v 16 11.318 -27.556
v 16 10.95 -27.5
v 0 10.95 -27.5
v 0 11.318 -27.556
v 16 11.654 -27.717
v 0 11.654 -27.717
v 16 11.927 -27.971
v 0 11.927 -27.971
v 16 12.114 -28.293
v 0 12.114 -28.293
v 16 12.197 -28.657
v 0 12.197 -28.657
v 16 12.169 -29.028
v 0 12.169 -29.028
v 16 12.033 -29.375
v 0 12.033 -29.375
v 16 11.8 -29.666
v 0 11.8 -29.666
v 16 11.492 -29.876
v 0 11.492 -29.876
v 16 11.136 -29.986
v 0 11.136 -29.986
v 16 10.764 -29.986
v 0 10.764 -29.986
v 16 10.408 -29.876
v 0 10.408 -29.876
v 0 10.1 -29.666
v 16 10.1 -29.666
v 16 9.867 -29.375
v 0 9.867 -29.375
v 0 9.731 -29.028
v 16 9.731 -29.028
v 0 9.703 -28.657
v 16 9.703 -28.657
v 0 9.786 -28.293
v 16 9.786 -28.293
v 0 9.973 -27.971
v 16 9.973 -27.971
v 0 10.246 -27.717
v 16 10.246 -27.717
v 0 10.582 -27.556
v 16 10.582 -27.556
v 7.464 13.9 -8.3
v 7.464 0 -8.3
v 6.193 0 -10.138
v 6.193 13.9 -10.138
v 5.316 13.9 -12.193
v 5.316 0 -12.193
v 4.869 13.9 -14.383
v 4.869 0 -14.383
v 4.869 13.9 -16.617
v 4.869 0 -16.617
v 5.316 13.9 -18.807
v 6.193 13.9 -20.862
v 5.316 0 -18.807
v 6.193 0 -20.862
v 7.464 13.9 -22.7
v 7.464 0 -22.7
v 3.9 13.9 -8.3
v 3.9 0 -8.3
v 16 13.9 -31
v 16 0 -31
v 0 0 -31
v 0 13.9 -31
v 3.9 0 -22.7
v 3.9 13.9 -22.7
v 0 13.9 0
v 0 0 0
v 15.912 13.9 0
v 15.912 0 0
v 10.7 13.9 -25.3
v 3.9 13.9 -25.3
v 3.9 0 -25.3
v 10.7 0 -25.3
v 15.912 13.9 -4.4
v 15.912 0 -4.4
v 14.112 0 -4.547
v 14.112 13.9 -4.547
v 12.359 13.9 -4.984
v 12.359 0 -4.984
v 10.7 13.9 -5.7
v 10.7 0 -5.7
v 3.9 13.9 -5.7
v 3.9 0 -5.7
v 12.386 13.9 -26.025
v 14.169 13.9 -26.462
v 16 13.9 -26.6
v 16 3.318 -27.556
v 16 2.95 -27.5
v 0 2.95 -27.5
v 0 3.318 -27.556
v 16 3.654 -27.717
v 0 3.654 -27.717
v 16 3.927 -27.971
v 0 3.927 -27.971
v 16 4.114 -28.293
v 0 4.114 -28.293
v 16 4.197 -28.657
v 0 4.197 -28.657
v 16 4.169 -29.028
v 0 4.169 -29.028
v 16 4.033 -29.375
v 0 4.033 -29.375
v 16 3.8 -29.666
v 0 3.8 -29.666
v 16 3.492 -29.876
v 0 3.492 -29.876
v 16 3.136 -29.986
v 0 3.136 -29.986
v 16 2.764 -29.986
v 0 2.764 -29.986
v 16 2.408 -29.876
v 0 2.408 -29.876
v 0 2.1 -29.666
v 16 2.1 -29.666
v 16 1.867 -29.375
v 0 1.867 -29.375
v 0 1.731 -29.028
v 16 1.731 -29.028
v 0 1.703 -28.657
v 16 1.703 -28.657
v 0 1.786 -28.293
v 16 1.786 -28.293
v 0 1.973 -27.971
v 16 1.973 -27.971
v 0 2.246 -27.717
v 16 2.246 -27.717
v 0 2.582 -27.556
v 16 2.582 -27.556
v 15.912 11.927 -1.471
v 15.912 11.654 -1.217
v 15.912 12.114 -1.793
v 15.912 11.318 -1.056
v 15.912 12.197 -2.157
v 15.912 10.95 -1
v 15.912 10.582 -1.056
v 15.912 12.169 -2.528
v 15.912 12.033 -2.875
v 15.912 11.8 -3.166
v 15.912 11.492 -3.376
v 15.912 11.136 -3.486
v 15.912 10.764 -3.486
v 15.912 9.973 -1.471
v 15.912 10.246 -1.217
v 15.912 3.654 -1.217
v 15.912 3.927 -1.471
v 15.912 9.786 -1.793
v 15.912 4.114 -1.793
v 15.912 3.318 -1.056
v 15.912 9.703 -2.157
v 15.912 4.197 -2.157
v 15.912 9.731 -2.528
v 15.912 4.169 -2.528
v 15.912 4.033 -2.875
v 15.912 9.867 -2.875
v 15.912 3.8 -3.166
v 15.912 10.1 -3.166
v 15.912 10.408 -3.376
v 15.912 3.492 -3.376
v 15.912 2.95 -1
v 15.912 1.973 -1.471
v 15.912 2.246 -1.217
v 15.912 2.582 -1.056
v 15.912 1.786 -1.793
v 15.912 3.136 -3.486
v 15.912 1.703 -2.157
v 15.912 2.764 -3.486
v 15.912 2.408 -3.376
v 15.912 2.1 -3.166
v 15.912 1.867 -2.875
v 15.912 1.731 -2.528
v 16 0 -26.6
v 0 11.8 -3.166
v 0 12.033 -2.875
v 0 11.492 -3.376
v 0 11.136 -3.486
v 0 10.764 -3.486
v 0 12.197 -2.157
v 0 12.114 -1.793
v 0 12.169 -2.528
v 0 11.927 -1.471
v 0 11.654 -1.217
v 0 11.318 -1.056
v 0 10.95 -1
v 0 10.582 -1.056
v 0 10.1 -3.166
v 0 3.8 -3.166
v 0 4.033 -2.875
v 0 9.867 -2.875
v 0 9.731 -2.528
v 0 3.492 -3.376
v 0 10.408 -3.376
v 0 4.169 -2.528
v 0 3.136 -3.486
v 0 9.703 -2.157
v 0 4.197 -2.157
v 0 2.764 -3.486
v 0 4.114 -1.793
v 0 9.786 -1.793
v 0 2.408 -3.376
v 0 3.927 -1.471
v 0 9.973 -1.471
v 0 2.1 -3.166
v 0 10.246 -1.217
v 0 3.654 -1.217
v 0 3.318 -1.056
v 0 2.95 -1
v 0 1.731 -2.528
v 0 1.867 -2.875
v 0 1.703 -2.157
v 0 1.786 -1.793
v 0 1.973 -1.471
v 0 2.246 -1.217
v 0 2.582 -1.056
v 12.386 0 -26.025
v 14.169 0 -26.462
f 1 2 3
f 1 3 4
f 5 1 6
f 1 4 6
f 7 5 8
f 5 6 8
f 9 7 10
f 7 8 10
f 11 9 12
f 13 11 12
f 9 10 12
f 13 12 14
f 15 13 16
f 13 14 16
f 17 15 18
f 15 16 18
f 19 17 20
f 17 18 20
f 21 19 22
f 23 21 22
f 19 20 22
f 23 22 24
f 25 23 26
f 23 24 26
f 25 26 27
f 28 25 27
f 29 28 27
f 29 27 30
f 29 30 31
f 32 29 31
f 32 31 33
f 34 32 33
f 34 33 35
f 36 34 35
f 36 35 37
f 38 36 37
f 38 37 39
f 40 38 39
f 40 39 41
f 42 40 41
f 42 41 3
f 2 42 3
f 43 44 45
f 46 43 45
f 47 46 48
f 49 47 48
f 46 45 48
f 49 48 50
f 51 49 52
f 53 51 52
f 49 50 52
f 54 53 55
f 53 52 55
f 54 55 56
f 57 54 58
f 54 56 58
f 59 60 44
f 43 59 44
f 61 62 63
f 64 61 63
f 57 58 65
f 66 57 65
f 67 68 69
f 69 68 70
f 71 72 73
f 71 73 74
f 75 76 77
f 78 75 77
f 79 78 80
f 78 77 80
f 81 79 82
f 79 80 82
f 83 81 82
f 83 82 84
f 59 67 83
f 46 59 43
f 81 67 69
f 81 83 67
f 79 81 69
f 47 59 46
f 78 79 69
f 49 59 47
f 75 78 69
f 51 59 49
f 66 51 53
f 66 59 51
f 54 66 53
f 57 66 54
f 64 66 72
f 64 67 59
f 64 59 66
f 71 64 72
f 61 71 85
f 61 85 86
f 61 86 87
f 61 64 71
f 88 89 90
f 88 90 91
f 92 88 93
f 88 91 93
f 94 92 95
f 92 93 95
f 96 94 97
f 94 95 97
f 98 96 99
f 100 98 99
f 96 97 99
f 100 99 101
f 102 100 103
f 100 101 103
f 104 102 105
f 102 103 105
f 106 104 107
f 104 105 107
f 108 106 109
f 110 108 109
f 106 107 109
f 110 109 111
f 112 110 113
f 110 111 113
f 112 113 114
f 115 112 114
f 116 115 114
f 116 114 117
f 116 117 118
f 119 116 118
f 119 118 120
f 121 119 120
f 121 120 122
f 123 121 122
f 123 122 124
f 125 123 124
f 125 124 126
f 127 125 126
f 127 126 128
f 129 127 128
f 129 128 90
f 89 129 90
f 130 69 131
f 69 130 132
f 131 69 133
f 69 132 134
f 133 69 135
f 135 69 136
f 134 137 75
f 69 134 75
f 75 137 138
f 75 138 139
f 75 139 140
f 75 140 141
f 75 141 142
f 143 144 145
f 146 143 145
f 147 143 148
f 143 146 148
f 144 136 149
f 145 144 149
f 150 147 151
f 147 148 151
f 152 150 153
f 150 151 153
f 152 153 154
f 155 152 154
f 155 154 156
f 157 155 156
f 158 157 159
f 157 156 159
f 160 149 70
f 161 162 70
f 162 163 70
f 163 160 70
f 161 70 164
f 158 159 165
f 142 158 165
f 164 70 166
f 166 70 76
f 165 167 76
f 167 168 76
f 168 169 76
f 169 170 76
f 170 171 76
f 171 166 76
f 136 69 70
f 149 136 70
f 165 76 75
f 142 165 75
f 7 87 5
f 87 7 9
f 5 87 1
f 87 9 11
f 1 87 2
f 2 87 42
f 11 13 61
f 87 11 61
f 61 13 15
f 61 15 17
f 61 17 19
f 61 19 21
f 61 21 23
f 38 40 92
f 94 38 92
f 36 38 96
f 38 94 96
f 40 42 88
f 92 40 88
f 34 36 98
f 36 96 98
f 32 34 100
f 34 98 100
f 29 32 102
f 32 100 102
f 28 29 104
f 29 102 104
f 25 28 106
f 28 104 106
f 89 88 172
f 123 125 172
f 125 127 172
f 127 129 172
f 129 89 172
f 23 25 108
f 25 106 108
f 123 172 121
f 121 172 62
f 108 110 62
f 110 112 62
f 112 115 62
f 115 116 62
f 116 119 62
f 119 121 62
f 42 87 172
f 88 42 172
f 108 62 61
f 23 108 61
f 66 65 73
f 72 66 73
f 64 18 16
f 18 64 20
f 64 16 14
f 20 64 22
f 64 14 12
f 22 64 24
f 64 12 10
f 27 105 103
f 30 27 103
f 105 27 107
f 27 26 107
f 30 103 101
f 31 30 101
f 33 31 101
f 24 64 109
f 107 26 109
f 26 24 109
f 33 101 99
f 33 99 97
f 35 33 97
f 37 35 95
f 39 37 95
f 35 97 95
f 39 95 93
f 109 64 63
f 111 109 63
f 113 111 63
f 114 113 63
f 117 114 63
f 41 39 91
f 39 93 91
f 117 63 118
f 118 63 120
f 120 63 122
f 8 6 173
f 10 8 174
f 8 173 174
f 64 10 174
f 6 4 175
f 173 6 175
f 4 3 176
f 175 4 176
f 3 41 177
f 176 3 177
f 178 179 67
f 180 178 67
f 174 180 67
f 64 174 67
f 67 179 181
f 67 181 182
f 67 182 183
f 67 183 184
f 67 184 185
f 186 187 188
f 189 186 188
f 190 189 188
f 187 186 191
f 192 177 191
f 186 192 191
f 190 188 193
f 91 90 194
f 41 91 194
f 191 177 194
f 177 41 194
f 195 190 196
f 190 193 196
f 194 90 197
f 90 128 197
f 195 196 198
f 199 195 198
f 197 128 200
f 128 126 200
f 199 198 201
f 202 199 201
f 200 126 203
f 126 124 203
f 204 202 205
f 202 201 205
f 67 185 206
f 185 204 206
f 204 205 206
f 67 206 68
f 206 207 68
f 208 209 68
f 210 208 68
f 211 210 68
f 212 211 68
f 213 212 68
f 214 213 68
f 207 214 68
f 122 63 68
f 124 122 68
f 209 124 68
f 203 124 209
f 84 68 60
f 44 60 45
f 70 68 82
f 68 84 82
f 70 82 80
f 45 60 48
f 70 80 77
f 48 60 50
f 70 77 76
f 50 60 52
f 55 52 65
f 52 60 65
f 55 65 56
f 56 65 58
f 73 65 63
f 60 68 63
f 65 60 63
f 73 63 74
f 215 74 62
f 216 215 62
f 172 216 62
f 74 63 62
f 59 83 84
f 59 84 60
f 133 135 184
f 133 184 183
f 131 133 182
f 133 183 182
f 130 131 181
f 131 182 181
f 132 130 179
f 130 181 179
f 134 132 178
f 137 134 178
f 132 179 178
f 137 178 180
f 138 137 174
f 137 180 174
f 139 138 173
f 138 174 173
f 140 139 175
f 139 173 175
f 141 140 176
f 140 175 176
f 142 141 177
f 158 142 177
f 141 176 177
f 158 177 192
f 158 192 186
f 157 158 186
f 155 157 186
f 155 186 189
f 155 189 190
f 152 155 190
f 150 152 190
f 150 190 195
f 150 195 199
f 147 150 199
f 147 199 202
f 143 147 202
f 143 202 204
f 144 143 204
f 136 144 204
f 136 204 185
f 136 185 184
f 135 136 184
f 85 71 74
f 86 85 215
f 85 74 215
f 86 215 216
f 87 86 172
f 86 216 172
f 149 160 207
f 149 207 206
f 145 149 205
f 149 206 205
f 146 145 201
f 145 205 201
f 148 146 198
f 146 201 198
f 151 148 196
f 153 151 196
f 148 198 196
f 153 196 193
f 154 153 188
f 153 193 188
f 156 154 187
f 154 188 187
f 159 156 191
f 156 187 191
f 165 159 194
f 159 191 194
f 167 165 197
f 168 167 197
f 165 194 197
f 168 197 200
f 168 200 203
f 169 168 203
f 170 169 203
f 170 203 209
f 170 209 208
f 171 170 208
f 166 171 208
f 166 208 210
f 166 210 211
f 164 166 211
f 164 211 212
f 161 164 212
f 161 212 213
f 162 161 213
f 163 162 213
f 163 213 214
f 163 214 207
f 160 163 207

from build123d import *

# Parameters (mm, degrees)
EXTRUDE_1_DEPTH     = 13.9
SKETCH_2_R          = 1.25
CUT_EXTRUDE_1_DEPTH = 38.552762881


with BuildPart() as part:
    # 草图1 → 凸台-拉伸1 (new body)
    with BuildSketch(Plane(origin=(0, 0, 0), x_dir=(1, 0, 0), z_dir=(0, 1, 0))):
        with BuildLine():
            Line((0, 0), (15.912485012, 0))
            Line((15.912485012, 0), (15.912485012, 4.4))
            ThreePointArc((15.912485012, 4.4), (13.226409808, 4.729902507), (10.7, 5.7))
            Line((10.7, 5.7), (3.9, 5.7))
            Line((3.9, 5.7), (3.9, 8.3))
            Line((3.9, 8.3), (7.464408308, 8.3))
            ThreePointArc((7.464408308, 8.3), (4.812485012, 15.5), (7.464408308, 22.7))
            Line((7.464408308, 22.7), (3.9, 22.7))
            Line((3.9, 22.7), (3.9, 25.3))
            Line((3.9, 25.3), (10.7, 25.3))
            ThreePointArc((10.7, 25.3), (13.26888799, 26.28060271), (16, 26.599655))
            Line((16, 26.599655), (16, 31))
            Line((16, 31), (0, 31))
            Line((0, 31), (0, 0))
        make_face()
    extrude(amount=EXTRUDE_1_DEPTH)

    # 草图2 → 切除-拉伸1 (cut, through all)
    with BuildSketch(Plane.ZY):
        with Locations((-28.75, 10.95)):
            Circle(SKETCH_2_R)
        with Locations((-2.25, 10.95)):
            Circle(SKETCH_2_R)
        with Locations((-2.25, 2.95)):
            Circle(SKETCH_2_R)
        with Locations((-28.75, 2.95)):
            Circle(SKETCH_2_R)
    extrude(amount=-CUT_EXTRUDE_1_DEPTH, mode=Mode.SUBTRACT)


solid = part.part
